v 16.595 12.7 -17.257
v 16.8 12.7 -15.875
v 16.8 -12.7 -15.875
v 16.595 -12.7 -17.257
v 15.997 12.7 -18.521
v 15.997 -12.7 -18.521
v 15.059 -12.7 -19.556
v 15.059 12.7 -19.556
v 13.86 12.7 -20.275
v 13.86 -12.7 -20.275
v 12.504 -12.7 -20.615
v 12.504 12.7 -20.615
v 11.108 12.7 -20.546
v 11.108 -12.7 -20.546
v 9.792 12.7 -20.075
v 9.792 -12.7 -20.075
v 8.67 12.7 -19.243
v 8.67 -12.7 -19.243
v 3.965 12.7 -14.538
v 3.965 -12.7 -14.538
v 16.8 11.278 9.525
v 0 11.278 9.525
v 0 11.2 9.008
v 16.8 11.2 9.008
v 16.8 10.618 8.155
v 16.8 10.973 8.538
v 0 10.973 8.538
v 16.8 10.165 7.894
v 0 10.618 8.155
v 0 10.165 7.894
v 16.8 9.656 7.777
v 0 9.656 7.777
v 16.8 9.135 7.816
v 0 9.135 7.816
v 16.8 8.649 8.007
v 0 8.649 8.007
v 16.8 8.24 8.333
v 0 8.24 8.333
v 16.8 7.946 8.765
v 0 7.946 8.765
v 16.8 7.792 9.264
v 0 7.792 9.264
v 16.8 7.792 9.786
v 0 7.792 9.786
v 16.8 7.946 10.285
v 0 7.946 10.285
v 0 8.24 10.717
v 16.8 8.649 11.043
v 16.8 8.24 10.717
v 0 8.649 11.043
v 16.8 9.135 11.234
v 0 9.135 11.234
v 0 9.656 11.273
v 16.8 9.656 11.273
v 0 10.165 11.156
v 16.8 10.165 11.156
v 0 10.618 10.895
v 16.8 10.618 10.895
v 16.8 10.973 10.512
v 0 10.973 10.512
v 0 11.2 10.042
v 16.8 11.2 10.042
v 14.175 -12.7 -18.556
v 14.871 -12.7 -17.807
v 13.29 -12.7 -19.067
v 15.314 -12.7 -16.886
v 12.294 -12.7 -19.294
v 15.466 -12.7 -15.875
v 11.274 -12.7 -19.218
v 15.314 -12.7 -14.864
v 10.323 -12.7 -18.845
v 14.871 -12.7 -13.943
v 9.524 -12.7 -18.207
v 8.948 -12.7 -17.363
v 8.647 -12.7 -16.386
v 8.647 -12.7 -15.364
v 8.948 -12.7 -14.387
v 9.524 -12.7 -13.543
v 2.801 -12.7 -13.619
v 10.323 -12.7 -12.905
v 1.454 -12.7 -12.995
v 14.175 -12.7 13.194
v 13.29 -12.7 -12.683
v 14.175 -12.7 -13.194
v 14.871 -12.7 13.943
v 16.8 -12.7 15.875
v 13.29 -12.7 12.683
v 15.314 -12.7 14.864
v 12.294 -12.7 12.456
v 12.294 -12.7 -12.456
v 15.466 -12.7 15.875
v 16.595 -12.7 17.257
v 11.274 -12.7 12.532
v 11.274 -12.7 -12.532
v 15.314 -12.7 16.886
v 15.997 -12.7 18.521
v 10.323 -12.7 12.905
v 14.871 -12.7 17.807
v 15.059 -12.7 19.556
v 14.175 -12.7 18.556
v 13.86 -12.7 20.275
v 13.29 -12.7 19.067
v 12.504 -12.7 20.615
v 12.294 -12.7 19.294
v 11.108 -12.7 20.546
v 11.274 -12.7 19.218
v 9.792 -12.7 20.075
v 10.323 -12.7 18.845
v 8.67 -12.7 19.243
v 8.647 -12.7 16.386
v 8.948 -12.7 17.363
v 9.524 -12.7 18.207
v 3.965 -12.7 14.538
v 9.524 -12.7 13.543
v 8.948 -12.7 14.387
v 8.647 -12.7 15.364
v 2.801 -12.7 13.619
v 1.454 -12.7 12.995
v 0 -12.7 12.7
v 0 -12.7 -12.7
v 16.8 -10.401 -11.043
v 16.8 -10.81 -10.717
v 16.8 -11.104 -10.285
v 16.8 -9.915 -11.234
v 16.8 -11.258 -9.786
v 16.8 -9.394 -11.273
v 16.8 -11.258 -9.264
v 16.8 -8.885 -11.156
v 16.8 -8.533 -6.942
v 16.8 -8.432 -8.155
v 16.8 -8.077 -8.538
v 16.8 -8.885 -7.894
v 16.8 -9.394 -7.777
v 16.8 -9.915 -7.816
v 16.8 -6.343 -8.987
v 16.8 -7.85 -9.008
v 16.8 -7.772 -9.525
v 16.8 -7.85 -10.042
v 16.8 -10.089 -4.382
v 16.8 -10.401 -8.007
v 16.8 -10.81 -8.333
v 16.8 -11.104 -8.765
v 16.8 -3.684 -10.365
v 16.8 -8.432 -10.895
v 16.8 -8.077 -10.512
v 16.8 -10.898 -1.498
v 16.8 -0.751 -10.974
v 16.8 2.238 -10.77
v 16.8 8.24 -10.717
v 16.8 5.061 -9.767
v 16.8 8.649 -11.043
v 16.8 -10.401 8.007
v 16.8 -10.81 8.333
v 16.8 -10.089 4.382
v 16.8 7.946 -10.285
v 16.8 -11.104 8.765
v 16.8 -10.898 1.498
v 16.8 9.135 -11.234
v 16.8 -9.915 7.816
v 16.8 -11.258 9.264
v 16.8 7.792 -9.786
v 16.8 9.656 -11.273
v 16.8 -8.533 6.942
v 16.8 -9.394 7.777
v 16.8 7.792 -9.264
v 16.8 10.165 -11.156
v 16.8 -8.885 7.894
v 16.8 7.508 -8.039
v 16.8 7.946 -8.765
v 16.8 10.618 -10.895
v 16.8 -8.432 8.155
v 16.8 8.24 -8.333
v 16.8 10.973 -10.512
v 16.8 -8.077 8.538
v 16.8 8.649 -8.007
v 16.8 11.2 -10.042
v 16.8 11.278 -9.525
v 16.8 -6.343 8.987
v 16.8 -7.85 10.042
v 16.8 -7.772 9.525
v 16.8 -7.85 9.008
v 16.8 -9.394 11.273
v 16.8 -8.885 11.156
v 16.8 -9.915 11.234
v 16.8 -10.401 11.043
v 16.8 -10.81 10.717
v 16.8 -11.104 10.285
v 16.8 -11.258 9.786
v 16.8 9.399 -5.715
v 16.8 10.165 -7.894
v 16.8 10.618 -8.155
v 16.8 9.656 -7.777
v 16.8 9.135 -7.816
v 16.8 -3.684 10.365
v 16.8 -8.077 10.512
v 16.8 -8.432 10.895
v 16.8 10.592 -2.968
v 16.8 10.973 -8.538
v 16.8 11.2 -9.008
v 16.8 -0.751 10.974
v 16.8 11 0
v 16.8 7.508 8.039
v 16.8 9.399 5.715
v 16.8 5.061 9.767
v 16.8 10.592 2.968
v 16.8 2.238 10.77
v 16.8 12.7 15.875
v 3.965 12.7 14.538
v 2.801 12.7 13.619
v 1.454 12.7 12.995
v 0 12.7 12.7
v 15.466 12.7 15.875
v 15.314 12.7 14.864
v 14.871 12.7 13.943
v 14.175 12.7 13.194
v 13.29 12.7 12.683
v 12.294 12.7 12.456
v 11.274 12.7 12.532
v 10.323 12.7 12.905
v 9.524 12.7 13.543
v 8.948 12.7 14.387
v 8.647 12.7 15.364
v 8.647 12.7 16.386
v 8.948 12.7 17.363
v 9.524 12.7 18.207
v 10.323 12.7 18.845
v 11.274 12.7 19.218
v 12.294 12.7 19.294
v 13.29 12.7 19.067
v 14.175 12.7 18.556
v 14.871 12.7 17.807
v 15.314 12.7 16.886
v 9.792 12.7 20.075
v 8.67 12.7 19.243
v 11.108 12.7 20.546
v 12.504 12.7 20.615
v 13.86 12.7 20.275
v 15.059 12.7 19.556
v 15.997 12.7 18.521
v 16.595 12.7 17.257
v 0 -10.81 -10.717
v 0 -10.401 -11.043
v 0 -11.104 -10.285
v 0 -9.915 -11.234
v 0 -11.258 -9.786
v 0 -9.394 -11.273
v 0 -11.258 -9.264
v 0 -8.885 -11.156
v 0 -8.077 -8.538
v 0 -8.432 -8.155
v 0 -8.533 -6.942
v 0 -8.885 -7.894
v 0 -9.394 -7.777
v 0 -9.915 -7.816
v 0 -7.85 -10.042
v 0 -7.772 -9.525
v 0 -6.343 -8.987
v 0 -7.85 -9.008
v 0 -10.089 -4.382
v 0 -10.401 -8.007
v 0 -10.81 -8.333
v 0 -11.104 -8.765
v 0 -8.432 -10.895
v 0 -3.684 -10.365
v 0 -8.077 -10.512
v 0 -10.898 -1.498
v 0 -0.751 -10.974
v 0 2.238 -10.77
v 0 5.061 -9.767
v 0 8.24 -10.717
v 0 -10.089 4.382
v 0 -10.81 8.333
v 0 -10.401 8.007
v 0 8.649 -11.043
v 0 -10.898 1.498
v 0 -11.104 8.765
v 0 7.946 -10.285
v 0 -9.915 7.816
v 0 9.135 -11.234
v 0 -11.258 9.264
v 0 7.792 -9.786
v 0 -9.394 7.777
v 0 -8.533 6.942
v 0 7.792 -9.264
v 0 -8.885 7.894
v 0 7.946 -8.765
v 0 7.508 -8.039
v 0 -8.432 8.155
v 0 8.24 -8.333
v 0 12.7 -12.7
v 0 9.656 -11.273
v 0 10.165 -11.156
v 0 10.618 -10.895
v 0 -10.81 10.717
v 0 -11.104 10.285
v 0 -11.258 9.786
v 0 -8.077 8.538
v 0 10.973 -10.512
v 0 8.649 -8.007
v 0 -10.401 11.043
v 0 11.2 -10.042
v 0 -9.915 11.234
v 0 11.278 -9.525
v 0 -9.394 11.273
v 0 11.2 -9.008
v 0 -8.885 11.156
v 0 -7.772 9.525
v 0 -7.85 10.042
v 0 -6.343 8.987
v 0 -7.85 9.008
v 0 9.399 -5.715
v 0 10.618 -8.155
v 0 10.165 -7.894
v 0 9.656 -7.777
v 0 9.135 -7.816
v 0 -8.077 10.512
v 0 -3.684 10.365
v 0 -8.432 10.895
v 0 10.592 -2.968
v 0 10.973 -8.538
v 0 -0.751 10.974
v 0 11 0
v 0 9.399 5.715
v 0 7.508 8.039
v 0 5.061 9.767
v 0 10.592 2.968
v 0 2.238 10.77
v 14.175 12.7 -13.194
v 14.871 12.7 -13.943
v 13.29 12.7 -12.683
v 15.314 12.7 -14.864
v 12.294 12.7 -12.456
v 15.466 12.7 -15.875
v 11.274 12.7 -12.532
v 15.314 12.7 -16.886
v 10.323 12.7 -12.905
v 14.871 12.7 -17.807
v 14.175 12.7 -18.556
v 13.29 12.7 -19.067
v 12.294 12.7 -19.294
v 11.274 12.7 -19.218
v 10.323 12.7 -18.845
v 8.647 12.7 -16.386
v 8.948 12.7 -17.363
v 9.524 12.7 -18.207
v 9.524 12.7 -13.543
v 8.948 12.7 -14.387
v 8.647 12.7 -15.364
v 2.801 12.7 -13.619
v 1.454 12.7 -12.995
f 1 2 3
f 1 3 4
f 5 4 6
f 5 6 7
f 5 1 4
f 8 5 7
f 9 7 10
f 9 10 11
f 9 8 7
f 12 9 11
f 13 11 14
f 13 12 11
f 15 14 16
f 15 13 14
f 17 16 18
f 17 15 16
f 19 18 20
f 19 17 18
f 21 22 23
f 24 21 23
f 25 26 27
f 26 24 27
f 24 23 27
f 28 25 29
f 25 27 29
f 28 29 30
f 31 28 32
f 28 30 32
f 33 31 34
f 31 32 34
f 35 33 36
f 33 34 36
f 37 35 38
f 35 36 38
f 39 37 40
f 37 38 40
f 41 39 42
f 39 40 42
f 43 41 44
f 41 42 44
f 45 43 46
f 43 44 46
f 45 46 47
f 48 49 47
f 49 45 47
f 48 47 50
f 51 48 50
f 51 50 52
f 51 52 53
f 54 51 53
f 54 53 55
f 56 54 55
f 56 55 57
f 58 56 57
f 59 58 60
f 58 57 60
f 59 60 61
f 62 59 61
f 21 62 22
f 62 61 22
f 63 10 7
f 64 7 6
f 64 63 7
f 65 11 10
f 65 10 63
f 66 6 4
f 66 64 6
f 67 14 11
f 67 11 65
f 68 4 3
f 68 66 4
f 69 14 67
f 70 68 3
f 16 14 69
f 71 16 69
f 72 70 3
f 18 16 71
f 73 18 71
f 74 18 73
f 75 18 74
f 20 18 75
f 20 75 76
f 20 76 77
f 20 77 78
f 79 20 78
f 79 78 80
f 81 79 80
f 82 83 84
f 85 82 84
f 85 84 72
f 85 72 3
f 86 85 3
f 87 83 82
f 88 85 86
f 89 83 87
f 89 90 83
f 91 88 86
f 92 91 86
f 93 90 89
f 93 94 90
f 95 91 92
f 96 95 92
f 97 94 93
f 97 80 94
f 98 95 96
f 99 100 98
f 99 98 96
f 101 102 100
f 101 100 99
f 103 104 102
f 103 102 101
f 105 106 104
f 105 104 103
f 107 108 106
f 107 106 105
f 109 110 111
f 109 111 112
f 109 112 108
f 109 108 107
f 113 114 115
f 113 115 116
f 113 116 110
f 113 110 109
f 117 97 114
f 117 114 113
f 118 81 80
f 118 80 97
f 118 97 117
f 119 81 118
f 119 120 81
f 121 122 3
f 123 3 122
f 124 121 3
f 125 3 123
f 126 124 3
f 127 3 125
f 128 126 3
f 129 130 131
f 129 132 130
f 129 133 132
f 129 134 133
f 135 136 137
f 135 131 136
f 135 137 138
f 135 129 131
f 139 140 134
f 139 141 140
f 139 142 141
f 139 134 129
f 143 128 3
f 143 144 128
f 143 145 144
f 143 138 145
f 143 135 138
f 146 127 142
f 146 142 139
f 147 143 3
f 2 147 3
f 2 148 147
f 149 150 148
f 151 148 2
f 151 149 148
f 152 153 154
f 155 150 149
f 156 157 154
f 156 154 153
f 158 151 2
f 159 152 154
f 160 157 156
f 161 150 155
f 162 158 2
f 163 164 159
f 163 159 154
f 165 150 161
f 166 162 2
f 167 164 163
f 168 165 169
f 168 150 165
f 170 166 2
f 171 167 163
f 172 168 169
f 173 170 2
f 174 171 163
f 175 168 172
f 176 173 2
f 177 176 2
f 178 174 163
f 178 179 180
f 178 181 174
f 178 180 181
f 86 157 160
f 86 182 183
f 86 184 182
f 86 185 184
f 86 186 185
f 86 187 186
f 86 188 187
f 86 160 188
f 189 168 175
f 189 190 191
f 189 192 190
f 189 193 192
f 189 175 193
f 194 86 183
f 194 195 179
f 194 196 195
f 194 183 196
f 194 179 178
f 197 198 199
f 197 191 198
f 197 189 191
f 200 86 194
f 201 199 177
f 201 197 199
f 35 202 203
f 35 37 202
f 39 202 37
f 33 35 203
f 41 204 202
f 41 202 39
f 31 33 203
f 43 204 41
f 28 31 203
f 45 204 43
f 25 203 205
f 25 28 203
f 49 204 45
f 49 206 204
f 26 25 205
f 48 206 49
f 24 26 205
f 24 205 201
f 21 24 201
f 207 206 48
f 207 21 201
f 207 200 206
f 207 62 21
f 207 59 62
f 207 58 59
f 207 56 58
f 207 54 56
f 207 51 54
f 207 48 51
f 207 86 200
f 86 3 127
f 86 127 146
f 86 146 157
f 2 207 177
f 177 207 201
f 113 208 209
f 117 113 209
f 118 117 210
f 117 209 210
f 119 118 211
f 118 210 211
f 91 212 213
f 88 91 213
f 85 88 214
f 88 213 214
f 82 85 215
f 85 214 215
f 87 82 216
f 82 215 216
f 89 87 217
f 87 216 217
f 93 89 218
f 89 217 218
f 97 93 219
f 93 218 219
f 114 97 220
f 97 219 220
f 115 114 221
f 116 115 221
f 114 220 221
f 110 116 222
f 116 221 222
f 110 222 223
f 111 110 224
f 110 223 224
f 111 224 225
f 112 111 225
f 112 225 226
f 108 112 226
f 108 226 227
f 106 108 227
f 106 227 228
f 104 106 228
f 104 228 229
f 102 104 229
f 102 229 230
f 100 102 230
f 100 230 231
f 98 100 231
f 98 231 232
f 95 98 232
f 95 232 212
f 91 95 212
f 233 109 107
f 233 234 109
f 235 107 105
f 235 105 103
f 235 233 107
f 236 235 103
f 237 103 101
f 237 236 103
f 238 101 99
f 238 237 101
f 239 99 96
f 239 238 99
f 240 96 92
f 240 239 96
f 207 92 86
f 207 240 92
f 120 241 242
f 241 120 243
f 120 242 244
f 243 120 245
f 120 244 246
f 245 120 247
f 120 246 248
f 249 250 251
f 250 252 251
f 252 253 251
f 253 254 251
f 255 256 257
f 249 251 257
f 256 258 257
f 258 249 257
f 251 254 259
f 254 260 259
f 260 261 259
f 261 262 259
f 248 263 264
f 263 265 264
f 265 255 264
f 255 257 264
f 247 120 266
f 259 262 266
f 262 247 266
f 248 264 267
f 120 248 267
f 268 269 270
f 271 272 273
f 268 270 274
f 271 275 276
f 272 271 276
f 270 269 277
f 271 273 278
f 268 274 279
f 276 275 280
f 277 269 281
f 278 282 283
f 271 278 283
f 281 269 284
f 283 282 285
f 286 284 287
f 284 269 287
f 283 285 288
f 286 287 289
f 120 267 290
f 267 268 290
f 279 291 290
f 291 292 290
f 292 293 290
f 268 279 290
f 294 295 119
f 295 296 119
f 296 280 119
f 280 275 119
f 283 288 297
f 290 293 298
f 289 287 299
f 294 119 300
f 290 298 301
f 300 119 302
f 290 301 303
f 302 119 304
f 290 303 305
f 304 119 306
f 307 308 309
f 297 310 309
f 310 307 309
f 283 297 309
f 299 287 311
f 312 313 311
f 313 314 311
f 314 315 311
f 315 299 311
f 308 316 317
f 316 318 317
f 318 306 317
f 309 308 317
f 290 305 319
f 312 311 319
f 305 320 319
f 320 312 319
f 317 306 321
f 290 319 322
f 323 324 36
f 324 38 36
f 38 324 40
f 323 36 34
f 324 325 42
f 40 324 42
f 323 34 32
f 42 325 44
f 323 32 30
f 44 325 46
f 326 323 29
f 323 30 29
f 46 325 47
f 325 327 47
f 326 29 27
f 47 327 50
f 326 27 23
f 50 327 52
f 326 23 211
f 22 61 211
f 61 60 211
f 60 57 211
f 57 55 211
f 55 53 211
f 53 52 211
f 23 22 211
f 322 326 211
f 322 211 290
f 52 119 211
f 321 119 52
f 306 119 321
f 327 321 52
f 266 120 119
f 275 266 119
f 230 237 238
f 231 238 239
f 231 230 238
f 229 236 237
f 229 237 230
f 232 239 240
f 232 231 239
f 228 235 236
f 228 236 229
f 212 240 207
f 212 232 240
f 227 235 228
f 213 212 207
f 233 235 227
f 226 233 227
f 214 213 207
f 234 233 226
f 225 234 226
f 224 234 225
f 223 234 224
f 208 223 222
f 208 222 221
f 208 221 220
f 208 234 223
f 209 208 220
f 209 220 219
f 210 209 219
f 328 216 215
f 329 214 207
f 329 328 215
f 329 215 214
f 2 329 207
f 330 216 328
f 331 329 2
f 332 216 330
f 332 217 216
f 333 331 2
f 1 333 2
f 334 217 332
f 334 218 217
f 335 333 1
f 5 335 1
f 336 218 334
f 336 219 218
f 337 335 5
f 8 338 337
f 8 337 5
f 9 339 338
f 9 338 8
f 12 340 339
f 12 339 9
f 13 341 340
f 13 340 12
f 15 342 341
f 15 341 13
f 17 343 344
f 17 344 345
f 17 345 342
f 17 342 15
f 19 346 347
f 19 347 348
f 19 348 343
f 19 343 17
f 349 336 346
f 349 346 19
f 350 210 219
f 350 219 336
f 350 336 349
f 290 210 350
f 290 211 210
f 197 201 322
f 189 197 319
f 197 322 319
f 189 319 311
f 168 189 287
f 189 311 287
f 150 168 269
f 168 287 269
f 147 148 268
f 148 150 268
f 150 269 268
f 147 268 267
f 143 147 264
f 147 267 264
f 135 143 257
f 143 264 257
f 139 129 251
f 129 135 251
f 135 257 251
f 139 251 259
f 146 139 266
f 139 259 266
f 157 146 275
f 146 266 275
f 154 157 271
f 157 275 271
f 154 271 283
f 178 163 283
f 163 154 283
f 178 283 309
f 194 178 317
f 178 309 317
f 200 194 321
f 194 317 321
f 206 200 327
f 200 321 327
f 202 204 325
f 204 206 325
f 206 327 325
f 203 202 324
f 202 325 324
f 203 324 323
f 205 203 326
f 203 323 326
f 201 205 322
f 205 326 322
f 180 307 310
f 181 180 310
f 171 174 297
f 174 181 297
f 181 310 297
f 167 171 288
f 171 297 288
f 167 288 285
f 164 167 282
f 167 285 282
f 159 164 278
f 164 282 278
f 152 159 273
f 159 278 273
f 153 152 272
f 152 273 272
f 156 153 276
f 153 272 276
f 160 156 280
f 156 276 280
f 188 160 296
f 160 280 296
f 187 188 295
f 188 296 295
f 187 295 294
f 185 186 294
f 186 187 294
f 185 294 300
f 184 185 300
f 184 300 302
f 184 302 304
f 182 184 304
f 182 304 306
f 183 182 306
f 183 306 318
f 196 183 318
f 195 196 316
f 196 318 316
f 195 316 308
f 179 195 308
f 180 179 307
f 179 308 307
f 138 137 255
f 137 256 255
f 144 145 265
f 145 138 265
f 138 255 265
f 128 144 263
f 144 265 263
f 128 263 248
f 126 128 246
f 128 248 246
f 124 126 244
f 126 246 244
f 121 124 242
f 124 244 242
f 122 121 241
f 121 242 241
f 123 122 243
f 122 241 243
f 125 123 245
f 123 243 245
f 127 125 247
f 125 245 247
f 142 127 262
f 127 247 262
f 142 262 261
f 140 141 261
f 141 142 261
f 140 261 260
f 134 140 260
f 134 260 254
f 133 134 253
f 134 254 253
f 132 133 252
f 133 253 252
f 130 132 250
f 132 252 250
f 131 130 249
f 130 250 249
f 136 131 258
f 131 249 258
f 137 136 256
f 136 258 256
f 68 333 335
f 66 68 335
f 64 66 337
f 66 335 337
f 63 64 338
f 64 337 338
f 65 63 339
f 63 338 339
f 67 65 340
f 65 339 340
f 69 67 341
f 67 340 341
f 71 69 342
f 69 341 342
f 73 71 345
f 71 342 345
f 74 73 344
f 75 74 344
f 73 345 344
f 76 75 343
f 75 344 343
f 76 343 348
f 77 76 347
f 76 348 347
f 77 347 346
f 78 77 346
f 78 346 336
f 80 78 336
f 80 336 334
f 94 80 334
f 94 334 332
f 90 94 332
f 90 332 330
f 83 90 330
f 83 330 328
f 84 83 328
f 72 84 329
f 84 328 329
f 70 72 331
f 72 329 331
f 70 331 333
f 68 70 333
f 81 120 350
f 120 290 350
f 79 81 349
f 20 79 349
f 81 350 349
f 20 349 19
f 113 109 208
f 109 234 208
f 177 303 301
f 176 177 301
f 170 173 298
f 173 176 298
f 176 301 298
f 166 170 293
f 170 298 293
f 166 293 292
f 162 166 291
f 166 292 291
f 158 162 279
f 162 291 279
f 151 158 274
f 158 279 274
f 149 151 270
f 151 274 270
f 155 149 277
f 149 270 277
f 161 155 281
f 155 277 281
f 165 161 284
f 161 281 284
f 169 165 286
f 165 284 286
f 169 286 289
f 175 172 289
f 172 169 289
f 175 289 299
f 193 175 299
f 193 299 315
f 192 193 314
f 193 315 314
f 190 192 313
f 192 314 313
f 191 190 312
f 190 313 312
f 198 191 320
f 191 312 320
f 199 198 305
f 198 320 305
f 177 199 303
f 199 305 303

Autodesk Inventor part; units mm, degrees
ref_plane "YZ Plane" through (0, 0, 0) normal (1, 0, 0) x (0, 1, 0)
ref_plane "XZ Plane" through (0, 0, 0) normal (0, 1, 0) x (-1, 0, 0)
ref_plane "XY Plane" through (0, 0, 0) normal (0, 0, 1) x (1, 0, 0)
sketch "Sketch1" plane through (0, 0, 0) normal (1, 0, 0) x (0, 1, 0)
  circle A0 centre (0, 0) radius 11
  line L0 (-12.7, 12.7) -> (12.7, 12.7)
  line L1 (12.7, 12.7) -> (12.7, -12.7)
  line L2 (12.7, -12.7) -> (-12.7, -12.7)
  line L3 (-12.7, -12.7) -> (-12.7, 12.7)
  line L4 (-12.7, 12.7) -> (12.7, -12.7) construction
  line L5 (12.7, 12.7) -> (-12.7, -12.7) construction
  line L6 (-9.525, 9.525) -> (9.525, 9.525) construction
  line L7 (9.525, 9.525) -> (9.525, -9.525) construction
  line L8 (9.525, -9.525) -> (-9.525, -9.525) construction
  line L9 (-9.525, -9.525) -> (-9.525, 9.525) construction
  line L10 (-9.525, 9.525) -> (9.525, -9.525) construction
  line L11 (9.525, 9.525) -> (-9.525, -9.525) construction
  circle A1 centre (9.525, 9.525) radius 1.7526
  circle A2 centre (-9.525, 9.525) radius 1.7526
  circle A3 centre (-9.525, -9.525) radius 1.7526
  circle A4 centre (9.525, -9.525) radius 1.7526
  dimension "d0" = 22
  dimension "d1" = 25.4
  dimension "d2" = 25.4
  dimension "d3" = 19.05
  dimension "d4" = 19.05
  dimension "d5" = 3.5052
  dimension "d8" = 360
extrude "Extrusion1" add sketch "Sketch1" along normal blind 16.8
sketch "Sketch2" plane through (0, 12.7, 12.7) normal (0, 1, 0) x (1, 0, 0)
  circle A0 centre (12.0375, -3.175) radius 4.7625
  circle A1 centre (12.0375, -3.175) radius 3.175
  line L0 (0, 0) -> (16.8, 0) projected
  line L1 (16.8, 25.4) -> (16.8, 0) projected
  line L2 (0, 12.7) -> (16.8, 12.7) construction
  line L3 (8.6699, -6.5426) -> (2.1273, 0)
  line L4 (16.8, -3.175) -> (16.8, 0)
  circle A2 centre (12.0375, 28.575) radius 4.7625
  circle A3 centre (12.0375, 28.575) radius 3.175
  line L5 (0, 25.4) -> (16.8, 25.4)
  line L6 (8.6699, 31.9426) -> (2.1273, 25.4)
  line L7 (16.8, 28.575) -> (16.8, 25.4)
  dimension "d12" = 9.525
  dimension "d13" = 6.35
  dimension "d14" = 45
extrude "Extrusion2" add sketch "Sketch2" against normal up to surface (25.4 mm away) contours A0 L0 | L3 L0 A0 | A0 L0 L4 | A2 L5 | L7 L5 A2 | A2 L5 L6 picked at (16.1976, -2.5571) picked at (16.1976, 27.9571)
fillet "Fillet1" radius 6.35 2 edges at (2.1273, 0, -12.7) (2.1273, 0, 12.7)
thicken "Thicken1" operation cut thickness 0.254 both sides no extend neighbours no toward (0.9967573, 0, 0.0804666) faces at (15.2022, -4.2333, 16.1305)
thicken "Thicken2" operation cut thickness 0.254 both sides no extend neighbours no toward (0.9870503, 0, -0.1604113) faces at (15.1714, 4.2333, -16.3843)
properties part number "Motor Sleeve" material "UHMW, Black"
